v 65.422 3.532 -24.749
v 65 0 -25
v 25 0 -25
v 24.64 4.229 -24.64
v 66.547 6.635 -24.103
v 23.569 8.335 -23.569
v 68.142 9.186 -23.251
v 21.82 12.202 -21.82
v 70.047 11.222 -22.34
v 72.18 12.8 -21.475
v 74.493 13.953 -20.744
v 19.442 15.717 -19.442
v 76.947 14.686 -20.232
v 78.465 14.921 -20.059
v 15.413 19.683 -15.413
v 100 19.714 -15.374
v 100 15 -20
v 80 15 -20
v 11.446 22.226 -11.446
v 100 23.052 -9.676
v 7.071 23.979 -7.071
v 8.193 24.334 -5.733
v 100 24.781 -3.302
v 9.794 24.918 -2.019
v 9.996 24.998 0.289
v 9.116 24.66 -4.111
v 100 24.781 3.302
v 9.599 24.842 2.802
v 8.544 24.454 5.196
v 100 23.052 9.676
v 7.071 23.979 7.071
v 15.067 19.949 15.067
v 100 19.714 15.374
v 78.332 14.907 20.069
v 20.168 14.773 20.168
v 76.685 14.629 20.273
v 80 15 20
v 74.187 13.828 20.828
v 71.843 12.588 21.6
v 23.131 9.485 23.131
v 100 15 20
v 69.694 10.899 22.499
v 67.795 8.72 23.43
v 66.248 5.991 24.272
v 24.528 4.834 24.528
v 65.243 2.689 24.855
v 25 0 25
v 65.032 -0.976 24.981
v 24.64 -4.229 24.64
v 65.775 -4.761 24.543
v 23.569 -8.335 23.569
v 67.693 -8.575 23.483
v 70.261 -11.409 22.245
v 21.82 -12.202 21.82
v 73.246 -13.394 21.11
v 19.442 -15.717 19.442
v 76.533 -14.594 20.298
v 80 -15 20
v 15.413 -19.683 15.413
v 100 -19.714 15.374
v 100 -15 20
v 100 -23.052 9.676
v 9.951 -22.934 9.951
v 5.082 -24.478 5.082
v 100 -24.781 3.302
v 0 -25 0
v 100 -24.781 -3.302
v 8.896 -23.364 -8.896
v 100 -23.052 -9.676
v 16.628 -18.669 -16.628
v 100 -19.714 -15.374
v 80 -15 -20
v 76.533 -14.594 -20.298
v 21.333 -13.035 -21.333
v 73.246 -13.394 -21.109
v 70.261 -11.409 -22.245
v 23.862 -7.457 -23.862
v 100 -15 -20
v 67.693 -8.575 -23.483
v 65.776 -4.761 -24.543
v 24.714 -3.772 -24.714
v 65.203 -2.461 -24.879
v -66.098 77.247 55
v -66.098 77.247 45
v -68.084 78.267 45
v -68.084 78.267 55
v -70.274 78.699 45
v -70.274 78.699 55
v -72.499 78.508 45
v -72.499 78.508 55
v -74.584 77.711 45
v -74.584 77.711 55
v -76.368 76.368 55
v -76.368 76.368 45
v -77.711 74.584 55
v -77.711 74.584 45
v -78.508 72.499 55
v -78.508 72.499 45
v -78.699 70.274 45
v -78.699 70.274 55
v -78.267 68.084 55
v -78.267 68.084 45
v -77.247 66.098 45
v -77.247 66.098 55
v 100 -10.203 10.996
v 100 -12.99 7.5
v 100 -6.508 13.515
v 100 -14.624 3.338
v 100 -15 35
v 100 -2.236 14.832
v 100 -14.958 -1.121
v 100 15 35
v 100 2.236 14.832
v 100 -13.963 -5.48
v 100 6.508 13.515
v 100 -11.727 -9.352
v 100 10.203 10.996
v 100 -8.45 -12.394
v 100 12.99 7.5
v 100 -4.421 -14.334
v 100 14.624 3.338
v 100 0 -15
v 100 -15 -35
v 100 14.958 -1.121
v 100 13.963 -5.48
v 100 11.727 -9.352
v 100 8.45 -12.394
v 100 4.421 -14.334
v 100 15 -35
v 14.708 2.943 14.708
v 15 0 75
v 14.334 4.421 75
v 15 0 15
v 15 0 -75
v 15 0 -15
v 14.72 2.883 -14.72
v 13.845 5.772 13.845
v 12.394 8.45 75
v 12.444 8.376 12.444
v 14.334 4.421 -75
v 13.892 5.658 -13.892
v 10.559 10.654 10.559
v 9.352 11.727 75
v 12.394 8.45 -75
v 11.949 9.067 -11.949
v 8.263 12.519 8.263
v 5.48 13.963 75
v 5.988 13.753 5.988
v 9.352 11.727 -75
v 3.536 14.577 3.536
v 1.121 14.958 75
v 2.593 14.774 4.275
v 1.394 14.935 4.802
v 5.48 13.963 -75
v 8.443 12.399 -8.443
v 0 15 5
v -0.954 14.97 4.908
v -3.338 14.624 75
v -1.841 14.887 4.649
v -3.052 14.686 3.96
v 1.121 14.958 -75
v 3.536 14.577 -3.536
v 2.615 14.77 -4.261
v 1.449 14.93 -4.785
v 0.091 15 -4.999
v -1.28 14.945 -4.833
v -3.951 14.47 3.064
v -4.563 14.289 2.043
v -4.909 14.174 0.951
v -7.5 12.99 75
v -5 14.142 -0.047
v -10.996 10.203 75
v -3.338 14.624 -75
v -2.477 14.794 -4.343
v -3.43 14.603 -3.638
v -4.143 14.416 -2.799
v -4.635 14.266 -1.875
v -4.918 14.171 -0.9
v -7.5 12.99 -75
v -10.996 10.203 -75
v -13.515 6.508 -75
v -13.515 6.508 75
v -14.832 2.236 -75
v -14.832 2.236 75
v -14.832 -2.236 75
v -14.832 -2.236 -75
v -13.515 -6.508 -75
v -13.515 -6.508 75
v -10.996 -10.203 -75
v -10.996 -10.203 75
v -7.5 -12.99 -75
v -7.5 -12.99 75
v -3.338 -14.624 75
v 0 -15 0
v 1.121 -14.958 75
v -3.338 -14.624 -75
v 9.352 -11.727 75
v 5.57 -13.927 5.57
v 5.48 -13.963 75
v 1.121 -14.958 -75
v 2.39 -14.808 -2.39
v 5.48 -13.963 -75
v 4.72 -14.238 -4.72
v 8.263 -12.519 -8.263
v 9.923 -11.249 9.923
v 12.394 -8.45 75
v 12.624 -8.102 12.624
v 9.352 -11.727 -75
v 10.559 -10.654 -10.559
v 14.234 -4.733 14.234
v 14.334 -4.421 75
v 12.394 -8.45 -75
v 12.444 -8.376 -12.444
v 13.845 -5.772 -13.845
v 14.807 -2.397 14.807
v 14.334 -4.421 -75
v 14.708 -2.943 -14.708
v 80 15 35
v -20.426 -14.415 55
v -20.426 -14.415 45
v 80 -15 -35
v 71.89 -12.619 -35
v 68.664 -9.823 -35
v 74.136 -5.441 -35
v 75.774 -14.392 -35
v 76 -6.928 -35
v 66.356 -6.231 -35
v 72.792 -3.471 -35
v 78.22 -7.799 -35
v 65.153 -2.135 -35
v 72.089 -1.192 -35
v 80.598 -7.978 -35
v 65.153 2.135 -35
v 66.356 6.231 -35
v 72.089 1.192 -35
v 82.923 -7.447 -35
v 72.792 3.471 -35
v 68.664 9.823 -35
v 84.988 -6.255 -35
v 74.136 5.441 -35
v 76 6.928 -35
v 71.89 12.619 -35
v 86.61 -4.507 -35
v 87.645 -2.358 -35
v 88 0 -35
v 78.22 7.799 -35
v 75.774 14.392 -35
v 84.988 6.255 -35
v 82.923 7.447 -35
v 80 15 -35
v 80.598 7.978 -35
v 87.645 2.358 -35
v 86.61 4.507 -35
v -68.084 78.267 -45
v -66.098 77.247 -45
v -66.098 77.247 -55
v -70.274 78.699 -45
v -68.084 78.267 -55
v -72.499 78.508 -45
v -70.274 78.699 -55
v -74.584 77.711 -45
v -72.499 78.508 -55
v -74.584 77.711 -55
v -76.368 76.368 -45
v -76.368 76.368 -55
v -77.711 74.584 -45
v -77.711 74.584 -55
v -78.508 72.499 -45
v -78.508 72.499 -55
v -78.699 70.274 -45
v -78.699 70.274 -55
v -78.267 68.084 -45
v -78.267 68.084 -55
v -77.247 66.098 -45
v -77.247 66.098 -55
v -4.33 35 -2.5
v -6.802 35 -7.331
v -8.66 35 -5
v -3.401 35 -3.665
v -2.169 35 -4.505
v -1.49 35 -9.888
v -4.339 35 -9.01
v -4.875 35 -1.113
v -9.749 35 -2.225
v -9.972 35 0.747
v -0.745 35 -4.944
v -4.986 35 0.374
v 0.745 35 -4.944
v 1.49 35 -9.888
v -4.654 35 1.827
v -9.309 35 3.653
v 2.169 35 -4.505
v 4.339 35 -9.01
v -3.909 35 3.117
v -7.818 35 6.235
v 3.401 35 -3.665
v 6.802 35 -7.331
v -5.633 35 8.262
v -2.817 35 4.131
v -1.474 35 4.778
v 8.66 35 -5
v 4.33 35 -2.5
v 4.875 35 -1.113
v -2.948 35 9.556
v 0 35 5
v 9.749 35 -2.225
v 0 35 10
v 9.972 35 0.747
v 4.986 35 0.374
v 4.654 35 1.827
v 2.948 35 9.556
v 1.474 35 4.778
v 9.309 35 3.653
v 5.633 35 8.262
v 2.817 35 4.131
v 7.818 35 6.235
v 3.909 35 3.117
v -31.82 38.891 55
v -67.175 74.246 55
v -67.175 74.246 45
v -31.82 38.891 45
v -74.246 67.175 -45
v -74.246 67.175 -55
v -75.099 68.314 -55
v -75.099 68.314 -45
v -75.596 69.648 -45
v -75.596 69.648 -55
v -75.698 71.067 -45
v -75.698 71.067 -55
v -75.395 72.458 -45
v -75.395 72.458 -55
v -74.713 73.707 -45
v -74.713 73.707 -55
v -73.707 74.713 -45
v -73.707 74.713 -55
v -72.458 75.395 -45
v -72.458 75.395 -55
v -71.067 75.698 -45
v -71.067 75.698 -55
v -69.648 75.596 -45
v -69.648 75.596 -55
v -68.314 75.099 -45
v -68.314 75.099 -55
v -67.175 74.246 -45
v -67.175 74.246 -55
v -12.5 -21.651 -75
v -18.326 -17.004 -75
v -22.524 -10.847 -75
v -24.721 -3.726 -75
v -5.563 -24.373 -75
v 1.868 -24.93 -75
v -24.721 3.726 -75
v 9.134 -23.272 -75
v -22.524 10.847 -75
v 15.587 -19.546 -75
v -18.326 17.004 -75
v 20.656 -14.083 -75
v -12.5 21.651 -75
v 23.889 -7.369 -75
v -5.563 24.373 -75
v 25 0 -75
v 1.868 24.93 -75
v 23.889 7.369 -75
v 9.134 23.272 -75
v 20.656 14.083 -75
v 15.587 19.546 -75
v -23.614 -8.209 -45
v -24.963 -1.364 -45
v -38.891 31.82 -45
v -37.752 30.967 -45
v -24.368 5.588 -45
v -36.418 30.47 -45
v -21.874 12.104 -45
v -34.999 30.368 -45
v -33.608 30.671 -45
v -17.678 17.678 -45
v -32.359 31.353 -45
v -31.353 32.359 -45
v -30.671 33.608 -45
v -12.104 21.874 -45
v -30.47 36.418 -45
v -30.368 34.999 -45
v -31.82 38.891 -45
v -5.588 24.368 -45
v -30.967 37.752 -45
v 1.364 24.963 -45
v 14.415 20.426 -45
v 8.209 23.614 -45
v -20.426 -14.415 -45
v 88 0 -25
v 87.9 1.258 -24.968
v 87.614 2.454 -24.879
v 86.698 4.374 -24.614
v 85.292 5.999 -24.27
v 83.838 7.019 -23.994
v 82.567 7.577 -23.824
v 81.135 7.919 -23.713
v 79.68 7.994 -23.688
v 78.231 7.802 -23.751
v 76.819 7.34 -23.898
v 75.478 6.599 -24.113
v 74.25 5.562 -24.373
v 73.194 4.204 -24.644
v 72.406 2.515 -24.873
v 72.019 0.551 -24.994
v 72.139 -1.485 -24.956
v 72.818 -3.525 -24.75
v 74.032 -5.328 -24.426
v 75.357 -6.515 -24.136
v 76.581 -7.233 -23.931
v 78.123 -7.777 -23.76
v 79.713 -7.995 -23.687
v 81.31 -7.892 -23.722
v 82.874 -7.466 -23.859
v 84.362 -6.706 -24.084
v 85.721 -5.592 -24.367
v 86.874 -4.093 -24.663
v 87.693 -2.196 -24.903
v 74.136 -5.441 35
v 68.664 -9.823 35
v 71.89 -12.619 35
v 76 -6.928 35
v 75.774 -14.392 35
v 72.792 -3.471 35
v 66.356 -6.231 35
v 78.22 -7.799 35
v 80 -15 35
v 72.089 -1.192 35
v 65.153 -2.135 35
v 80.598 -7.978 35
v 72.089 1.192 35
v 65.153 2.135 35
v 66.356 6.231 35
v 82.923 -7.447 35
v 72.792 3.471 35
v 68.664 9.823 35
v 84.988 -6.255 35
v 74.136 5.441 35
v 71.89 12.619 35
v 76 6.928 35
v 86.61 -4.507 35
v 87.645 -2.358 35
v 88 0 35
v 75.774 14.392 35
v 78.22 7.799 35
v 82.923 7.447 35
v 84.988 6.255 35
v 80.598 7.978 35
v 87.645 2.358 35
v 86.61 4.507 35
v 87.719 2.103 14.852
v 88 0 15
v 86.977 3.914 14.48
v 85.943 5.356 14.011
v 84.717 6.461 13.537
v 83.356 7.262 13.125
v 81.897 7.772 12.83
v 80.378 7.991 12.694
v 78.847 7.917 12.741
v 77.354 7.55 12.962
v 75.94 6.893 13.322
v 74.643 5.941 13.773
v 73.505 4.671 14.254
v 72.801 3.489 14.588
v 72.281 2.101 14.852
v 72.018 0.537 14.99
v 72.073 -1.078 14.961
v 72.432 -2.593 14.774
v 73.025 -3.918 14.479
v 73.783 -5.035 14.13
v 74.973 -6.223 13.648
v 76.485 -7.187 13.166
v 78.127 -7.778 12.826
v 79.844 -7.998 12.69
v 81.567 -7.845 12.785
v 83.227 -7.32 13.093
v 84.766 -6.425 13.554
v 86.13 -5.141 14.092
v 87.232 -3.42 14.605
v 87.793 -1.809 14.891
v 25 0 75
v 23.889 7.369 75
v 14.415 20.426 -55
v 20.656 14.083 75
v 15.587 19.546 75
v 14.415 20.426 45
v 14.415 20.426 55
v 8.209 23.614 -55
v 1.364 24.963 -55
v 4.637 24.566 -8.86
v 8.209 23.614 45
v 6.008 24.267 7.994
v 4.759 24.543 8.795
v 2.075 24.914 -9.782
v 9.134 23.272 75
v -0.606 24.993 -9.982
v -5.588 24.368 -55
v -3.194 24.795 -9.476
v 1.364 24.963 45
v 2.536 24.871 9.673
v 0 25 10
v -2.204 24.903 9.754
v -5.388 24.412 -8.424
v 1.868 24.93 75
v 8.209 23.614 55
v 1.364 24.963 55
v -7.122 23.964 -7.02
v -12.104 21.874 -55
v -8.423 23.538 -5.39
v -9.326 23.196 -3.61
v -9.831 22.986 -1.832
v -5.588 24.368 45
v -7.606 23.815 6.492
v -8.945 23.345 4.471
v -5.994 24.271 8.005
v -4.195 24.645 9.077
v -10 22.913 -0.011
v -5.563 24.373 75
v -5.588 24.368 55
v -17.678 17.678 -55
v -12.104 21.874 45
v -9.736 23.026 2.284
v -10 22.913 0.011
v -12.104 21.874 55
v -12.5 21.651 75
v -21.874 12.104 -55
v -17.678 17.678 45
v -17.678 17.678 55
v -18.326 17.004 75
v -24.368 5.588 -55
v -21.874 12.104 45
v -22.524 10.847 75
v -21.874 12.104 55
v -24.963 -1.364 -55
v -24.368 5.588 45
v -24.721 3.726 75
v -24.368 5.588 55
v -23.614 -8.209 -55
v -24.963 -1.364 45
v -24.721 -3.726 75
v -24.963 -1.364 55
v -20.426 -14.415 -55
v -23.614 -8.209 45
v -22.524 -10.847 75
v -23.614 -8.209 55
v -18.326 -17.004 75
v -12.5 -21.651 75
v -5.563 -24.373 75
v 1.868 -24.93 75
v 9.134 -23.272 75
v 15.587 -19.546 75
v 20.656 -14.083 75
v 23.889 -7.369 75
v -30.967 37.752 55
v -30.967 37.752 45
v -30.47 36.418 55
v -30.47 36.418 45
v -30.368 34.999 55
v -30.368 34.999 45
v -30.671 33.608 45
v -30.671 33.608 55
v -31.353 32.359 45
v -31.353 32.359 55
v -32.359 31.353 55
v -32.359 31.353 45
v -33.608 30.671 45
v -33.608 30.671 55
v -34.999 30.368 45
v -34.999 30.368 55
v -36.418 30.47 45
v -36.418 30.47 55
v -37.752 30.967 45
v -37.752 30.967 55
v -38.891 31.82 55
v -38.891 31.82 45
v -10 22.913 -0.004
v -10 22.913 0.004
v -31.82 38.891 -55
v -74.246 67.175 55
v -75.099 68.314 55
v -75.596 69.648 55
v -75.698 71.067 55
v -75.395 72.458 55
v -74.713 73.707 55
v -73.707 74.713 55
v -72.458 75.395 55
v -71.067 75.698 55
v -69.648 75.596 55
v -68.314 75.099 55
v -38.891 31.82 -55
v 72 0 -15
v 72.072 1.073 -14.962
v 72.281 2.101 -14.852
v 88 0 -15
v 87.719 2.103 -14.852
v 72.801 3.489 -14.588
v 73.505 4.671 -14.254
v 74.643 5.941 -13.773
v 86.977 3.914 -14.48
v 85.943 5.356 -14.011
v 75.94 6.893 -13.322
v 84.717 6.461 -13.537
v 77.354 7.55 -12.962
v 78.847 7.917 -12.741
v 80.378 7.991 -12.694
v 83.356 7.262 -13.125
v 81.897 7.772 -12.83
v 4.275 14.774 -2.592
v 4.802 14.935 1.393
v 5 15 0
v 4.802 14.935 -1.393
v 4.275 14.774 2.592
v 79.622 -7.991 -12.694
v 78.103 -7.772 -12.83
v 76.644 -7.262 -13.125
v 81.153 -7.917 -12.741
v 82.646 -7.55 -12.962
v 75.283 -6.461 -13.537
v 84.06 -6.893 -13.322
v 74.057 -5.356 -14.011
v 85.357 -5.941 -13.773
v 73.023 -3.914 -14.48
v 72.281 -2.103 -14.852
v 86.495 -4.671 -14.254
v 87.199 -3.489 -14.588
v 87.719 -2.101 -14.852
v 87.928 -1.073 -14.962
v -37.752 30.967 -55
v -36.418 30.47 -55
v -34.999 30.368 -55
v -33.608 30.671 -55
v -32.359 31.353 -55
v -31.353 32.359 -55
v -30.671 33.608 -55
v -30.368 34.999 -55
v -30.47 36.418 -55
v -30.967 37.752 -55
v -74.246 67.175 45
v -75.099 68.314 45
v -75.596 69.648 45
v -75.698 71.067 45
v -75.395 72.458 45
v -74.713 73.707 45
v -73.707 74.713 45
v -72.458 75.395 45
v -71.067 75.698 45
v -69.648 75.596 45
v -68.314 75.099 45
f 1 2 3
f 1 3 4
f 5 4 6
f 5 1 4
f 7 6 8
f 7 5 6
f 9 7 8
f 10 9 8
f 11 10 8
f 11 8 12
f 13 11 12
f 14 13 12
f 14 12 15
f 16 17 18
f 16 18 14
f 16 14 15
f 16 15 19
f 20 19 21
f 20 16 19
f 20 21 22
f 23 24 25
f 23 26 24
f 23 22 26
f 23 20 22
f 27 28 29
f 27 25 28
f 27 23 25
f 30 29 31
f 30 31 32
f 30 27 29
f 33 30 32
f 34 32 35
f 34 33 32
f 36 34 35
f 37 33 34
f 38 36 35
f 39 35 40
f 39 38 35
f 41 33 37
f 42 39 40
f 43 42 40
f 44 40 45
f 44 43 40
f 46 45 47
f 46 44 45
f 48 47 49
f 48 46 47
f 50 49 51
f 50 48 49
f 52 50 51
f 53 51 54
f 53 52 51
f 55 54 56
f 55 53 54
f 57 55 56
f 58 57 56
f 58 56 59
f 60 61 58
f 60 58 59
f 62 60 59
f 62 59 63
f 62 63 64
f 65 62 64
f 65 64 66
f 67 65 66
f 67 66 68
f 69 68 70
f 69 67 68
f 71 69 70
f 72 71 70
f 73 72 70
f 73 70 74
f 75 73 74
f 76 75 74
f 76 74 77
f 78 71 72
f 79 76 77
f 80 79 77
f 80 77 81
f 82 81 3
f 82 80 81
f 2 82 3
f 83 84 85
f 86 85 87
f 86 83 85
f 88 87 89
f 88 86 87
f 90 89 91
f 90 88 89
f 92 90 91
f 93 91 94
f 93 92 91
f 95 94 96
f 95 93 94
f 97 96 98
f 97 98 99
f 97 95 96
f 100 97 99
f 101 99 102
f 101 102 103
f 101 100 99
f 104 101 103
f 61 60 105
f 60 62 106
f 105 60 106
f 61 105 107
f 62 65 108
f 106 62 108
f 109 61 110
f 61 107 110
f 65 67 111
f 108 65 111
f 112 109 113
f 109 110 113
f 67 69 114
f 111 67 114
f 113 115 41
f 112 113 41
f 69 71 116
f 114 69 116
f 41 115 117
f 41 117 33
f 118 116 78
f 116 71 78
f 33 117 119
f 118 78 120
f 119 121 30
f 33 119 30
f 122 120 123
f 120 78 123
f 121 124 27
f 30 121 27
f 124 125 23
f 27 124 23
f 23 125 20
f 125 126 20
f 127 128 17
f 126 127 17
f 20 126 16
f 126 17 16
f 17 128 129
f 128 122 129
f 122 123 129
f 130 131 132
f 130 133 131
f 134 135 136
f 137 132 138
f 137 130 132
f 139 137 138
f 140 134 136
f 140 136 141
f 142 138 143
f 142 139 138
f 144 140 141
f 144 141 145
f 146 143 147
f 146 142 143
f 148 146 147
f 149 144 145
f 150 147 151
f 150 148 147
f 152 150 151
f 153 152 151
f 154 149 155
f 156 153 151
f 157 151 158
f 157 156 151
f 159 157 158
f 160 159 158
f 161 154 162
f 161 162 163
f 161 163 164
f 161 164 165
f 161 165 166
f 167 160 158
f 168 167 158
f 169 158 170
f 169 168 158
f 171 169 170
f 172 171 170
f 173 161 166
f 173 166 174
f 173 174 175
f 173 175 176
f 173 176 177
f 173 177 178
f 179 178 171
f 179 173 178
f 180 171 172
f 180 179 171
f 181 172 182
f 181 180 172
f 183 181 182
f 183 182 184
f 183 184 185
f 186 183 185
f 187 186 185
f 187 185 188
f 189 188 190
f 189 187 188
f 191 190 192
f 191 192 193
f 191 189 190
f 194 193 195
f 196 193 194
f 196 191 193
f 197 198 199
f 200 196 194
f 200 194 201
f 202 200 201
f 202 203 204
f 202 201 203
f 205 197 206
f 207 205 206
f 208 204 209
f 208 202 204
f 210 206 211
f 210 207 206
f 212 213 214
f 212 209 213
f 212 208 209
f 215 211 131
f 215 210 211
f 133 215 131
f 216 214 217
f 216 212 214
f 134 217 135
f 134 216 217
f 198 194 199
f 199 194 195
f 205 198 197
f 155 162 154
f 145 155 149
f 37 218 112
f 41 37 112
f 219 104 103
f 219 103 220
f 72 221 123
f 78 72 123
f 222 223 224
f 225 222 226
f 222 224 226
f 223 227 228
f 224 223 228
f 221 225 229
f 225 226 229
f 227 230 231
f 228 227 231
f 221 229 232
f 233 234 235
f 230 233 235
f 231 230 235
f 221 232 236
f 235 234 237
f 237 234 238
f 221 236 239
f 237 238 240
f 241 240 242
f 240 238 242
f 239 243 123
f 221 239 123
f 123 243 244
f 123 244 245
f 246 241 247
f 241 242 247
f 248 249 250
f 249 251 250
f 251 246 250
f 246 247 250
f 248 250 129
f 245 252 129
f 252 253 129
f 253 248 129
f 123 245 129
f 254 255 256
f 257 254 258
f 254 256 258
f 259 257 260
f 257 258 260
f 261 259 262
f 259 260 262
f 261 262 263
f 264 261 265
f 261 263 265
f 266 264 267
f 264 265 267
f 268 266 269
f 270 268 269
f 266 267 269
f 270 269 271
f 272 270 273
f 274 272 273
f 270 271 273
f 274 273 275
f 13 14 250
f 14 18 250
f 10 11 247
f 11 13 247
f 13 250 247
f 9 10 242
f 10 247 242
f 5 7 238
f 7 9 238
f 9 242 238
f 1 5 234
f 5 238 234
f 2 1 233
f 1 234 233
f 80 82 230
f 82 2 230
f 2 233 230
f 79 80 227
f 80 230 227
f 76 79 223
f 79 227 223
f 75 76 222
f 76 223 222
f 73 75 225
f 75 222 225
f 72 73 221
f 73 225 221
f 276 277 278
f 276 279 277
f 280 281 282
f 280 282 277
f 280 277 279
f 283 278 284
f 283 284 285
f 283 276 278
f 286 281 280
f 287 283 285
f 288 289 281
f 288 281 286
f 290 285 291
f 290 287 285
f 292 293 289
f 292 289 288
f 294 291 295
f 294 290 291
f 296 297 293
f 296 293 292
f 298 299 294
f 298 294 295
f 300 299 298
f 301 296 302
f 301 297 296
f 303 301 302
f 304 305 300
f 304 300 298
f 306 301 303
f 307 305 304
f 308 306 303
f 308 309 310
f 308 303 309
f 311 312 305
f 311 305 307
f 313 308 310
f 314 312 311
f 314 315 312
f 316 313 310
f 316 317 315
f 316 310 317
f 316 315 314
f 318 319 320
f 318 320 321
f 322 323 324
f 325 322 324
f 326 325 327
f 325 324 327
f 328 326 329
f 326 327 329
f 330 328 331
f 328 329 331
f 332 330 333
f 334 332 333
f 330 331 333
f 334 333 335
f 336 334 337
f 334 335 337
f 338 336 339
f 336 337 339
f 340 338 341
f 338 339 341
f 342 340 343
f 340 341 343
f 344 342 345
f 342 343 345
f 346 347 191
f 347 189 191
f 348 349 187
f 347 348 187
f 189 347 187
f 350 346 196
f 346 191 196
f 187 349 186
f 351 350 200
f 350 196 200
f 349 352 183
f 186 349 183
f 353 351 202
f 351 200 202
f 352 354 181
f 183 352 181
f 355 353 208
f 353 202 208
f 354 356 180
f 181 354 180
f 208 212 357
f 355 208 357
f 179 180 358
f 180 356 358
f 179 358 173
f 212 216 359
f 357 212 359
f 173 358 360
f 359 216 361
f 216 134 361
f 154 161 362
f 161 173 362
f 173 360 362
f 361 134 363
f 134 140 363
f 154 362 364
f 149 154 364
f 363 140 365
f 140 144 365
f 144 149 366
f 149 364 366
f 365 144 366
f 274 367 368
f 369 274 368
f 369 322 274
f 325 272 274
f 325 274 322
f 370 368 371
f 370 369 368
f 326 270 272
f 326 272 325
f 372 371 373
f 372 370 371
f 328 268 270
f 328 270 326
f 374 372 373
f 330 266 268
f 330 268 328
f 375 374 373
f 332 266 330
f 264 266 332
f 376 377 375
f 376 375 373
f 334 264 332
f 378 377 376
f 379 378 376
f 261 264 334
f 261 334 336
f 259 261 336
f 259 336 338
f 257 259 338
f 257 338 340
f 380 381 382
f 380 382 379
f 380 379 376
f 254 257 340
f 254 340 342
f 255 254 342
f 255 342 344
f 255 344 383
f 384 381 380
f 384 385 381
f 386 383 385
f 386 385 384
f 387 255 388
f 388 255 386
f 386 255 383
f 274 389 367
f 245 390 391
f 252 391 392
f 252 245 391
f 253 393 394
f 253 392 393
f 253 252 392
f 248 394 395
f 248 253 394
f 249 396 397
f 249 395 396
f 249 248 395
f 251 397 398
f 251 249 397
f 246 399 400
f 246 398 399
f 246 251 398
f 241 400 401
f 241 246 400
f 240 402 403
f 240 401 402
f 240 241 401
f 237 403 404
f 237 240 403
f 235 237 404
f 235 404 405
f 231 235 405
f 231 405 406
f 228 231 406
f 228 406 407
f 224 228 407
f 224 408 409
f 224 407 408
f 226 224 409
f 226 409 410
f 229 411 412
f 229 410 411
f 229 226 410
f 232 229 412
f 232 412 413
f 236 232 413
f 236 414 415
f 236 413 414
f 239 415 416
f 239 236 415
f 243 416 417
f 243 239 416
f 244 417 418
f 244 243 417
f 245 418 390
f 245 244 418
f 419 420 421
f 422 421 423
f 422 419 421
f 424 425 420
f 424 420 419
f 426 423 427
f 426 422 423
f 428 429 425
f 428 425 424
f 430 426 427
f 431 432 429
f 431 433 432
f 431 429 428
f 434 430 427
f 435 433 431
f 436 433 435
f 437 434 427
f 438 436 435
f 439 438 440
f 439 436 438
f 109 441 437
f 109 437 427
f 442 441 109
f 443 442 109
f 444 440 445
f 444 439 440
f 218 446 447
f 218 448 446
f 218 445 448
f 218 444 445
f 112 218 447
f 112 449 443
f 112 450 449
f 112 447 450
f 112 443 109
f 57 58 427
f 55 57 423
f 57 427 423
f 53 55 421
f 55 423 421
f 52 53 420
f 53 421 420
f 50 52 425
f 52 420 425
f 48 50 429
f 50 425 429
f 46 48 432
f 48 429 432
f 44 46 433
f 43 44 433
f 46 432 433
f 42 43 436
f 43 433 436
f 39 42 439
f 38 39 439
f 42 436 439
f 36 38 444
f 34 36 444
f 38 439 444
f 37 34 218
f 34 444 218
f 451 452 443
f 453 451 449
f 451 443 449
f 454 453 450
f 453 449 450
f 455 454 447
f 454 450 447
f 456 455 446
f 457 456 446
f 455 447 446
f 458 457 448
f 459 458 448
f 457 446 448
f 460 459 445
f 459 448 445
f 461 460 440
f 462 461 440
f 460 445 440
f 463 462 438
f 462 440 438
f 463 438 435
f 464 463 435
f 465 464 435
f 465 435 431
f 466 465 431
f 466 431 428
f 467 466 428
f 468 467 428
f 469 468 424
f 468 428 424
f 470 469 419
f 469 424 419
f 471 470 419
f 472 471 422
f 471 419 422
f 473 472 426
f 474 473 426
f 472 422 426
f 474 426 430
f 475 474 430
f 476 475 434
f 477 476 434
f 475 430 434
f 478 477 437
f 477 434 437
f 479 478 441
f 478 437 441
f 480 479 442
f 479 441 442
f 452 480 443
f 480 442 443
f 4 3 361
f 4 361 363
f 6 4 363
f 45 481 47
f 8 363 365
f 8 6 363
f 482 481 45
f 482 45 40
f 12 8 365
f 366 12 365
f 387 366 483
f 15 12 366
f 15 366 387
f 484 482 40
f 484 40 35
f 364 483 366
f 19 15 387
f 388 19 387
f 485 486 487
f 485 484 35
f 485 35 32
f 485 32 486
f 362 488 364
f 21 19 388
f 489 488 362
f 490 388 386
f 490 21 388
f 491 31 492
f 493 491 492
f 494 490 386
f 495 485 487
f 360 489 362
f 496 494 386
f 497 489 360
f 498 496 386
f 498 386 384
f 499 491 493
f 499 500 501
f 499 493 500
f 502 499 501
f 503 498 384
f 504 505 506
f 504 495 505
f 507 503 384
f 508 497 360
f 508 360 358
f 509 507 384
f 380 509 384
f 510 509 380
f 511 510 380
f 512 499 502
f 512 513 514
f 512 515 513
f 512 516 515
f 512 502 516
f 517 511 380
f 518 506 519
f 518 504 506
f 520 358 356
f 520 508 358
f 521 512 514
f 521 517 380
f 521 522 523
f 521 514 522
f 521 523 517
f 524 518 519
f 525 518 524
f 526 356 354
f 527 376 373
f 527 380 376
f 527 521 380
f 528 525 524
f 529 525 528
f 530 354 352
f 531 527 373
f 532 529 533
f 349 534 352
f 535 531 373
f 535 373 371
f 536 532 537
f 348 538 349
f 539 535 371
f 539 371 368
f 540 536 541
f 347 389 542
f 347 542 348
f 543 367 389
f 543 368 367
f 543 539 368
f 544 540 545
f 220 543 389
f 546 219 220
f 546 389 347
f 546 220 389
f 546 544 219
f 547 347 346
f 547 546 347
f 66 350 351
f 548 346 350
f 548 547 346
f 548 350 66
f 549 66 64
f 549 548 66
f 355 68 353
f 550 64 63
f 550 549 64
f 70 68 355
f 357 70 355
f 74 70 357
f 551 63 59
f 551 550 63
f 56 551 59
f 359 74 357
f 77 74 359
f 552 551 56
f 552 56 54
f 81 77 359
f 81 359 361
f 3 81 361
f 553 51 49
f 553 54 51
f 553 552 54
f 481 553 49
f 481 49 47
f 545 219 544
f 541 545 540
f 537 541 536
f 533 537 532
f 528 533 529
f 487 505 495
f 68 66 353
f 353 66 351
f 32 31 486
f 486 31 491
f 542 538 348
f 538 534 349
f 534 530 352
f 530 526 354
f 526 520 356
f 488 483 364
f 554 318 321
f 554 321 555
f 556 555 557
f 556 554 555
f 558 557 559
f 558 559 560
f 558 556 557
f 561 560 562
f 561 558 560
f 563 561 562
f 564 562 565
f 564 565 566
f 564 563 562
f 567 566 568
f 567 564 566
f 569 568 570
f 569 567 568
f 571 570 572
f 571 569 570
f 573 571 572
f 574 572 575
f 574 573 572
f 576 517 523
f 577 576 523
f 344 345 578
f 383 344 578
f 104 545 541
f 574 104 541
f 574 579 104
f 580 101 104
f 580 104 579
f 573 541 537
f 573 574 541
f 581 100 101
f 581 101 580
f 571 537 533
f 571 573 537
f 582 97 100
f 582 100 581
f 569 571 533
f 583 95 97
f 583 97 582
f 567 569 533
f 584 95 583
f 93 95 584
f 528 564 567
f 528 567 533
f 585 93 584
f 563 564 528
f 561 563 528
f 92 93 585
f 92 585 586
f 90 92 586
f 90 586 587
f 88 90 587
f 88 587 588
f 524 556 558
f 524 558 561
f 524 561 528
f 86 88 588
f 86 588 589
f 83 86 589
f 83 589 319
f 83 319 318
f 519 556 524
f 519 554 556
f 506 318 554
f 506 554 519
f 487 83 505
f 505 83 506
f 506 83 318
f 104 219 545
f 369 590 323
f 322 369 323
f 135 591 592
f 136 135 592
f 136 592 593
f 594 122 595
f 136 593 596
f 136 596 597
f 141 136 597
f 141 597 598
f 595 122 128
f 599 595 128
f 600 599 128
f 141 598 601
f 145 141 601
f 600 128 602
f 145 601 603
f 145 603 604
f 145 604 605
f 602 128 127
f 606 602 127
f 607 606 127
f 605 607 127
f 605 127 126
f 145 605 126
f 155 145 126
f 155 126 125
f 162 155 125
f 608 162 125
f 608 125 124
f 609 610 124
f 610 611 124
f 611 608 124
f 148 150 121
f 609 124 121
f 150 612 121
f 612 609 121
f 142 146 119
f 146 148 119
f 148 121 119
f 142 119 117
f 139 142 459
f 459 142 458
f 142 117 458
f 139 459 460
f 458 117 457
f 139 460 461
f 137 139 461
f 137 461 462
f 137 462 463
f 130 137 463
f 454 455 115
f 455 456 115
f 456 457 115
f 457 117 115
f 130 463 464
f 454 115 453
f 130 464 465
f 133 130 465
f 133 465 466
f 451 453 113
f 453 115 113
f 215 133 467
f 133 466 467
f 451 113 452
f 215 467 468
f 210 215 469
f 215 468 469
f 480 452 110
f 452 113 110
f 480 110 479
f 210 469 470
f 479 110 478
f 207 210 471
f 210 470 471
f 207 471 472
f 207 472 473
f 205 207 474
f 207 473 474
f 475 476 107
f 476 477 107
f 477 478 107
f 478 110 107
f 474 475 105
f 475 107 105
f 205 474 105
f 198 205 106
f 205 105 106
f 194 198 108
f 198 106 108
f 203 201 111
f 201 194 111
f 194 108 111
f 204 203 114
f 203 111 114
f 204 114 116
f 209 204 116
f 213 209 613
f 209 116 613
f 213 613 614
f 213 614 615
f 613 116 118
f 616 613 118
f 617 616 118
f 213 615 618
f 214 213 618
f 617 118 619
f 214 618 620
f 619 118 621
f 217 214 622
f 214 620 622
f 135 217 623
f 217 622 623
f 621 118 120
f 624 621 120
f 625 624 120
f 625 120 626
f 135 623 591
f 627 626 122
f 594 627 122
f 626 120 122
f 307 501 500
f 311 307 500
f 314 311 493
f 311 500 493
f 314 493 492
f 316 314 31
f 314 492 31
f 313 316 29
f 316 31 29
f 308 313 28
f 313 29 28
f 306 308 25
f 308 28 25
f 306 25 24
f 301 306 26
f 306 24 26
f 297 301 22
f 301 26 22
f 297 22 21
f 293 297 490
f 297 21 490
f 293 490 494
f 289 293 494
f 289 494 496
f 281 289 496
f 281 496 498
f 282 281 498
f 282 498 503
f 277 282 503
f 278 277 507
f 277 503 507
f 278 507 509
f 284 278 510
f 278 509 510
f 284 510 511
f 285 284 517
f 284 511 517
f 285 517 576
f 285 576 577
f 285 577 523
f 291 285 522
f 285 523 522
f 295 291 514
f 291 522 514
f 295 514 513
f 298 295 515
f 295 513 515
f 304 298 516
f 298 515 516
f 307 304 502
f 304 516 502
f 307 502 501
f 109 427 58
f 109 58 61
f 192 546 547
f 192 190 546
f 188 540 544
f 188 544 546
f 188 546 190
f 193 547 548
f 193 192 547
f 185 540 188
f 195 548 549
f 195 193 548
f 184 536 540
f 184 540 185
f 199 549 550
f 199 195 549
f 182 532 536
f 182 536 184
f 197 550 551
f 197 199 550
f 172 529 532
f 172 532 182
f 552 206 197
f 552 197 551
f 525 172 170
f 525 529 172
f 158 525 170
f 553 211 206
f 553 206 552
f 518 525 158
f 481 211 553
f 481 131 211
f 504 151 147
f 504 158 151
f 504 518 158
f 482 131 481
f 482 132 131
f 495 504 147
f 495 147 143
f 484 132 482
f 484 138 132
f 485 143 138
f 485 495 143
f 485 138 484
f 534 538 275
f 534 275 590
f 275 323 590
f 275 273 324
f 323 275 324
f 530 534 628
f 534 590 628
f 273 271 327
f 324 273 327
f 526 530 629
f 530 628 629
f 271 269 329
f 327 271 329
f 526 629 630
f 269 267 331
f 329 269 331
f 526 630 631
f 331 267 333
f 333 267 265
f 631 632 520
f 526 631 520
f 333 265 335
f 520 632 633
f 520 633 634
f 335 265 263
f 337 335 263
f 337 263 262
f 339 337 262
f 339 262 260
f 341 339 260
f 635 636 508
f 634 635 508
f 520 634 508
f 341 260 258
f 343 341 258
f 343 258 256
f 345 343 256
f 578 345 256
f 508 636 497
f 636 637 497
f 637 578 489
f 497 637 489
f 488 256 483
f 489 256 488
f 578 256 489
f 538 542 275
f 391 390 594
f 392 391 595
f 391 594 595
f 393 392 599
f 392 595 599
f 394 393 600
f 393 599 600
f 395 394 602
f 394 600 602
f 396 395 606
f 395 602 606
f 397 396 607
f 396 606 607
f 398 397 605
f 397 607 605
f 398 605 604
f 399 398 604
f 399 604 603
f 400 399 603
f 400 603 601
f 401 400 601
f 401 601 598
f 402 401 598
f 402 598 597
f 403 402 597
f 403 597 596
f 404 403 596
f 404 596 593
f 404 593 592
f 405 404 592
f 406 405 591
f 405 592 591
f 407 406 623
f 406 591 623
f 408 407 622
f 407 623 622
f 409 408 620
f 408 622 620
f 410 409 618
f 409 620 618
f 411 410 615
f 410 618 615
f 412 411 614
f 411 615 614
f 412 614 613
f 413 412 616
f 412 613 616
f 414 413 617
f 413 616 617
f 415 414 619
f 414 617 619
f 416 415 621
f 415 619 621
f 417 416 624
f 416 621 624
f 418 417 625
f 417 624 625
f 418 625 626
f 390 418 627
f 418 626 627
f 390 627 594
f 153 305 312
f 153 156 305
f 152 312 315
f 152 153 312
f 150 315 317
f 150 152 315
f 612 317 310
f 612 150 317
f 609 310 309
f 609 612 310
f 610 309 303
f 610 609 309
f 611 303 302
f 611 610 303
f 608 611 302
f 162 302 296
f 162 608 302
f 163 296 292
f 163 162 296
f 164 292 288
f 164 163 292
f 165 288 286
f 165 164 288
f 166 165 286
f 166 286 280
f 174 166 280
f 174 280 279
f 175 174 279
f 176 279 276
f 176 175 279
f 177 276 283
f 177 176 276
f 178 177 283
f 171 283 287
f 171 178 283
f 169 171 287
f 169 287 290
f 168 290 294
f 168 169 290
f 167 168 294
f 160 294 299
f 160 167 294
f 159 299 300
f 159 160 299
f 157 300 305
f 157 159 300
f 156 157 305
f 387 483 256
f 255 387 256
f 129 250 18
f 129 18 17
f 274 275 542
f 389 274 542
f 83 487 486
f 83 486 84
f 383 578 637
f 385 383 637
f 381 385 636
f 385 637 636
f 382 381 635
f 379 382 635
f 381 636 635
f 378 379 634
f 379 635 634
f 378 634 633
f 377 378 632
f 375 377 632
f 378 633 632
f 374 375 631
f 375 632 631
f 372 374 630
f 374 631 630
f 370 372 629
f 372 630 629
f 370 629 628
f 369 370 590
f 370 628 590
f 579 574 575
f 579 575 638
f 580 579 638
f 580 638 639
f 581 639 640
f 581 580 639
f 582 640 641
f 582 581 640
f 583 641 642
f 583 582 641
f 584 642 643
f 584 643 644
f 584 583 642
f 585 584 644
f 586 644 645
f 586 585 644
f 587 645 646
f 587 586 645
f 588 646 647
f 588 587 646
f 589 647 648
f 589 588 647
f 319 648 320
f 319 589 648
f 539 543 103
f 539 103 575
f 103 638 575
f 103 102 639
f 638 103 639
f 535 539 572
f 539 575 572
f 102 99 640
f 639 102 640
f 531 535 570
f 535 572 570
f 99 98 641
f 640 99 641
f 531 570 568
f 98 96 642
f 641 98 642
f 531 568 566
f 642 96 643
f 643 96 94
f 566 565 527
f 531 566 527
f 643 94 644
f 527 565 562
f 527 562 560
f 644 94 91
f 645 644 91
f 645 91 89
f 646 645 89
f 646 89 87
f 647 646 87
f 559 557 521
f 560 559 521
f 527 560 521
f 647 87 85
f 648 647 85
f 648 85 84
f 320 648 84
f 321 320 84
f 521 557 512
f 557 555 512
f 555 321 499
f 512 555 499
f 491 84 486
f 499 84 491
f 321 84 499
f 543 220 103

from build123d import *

# Parameters (mm, degrees)
CROQUIS1_R                   = 25
CROQUIS1_R_2                 = 15
SALIENTE_EXTRUIR1_DEPTH      = 75
SALIENTE_EXTRUIR3_REACH      = 184.916
SALIENTE_EXTRUIR3_END_RADIUS = 25
SALIENTE_EXTRUIR3_START      = 100
CROQUIS2_R                   = 25
CROQUIS2_R_2                 = 15
CORTAR_EXTRUIR1_REACH        = 129.475
CROQUIS2_2_R                 = 15
SALIENTE_EXTRUIR4_REACH      = 164.475
SALIENTE_EXTRUIR4_END_RADIUS = 25
SALIENTE_EXTRUIR4_START      = 35
CROQUIS3_W                   = 35
CROQUIS3_H                   = 30
REDONDEO1_R                  = 15
CROQUIS4_R                   = 8
CORTAR_EXTRUIR2_DEPTH        = 151.7481344
SALIENTE_EXTRUIR5_START      = 55
SALIENTE_EXTRUIR5_DEPTH      = 10
SALIENTE_EXTRUIR6_START      = 22.912881
CROQUIS6_R                   = 10
CROQUIS6_R_2                 = 5
SALIENTE_EXTRUIR6_DEPTH      = 12.087119
CORTAR_EXTRUIR3_REACH        = 149.717
CROQUIS6_2_R                 = 5
REDONDEO1_OF_SIMETR_A1_R     = 15


with BuildPart() as part:
    # Croquis1 → Saliente-Extruir1 (new, symmetric)
    with BuildSketch(Plane.XY):
        Circle(CROQUIS1_R)
        Circle(CROQUIS1_R_2, mode=Mode.SUBTRACT)
    extrude(amount=SALIENTE_EXTRUIR1_DEPTH, both=True)

    # Saliente-Extruir3: up to this cylinder (the profile starts outside it)
    saliente_extruir3_end = Plane(origin=(0, 0, 24.292893), z_dir=(0, 0, -1)) * Cylinder(SALIENTE_EXTRUIR3_END_RADIUS, 420.832, mode=Mode.PRIVATE)
    # Croquis2 → Saliente-Extruir3 (add, up to the surface)
    with BuildSketch(Plane(origin=(0, 0, 0), x_dir=(0, 0, -1), z_dir=(1, 0, 0)).offset(SALIENTE_EXTRUIR3_START), mode=Mode.PRIVATE) as saliente_extruir3_sk1:
        Circle(CROQUIS2_R)
        Circle(CROQUIS2_R_2, mode=Mode.SUBTRACT)
    saliente_extruir3_tool1 = extrude(saliente_extruir3_sk1.sketch, amount=-SALIENTE_EXTRUIR3_REACH, mode=Mode.PRIVATE) - saliente_extruir3_end
    add(saliente_extruir3_tool1.solids().sort_by_distance((100, 0, 24.292893))[0])

    # Croquis2<2> → Cortar-Extruir1 (cut, up to next)
    with BuildSketch(Plane(origin=(0, 0, 0), x_dir=(0, 0, -1), z_dir=(1, 0, 0)), mode=Mode.PRIVATE) as cortar_extruir1_sk1:
        Circle(CROQUIS2_2_R)
    cortar_extruir1_tool1 = extrude(cortar_extruir1_sk1.sketch, amount=CORTAR_EXTRUIR1_REACH, mode=Mode.PRIVATE) & part.part
    add(cortar_extruir1_tool1.solids().sort_by_distance((0, 0, 0))[0], mode=Mode.SUBTRACT)

    # Saliente-Extruir4: up to this cylinder (the profile starts outside it)
    saliente_extruir4_end = Plane(origin=(82.5, 0, 0), z_dir=(1, 0, 0)) * Cylinder(SALIENTE_EXTRUIR4_END_RADIUS, 379.95, mode=Mode.PRIVATE)
    # Croquis3 → Saliente-Extruir4 (add, up to the surface)
    with BuildSketch(Plane.XY.offset(SALIENTE_EXTRUIR4_START), mode=Mode.PRIVATE) as saliente_extruir4_sk1:
        with Locations((82.5, 0)):
            Rectangle(CROQUIS3_W, CROQUIS3_H)
    saliente_extruir4_tool1 = extrude(saliente_extruir4_sk1.sketch, amount=-SALIENTE_EXTRUIR4_REACH, mode=Mode.PRIVATE) - saliente_extruir4_end
    saliente_extruir4 = saliente_extruir4_tool1.solids().sort_by_distance((82.5, 0, 35))[0]
    add(saliente_extruir4)

    # Redondeo1
    # the kernel refuses this fillet: 15 mm, written as the material it takes off along each edge
    with BuildSketch(Plane(origin=(65, 15, 72.5), x_dir=(1, 0, 0), z_dir=(0, 0, -1))) as redondeo1_piece_1_section:
        with BuildLine():
            CenterArc((REDONDEO1_R, REDONDEO1_R), REDONDEO1_R, 180, 90)
            Line((0, REDONDEO1_R), (0, 0))
            Line((0, 0), (REDONDEO1_R, 0))
        make_face()
    redondeo1_piece_1 = extrude(amount=90, mode=Mode.PRIVATE)
    redondeo1_piece_1 = redondeo1_piece_1 - Plane(origin=(68.454600716, 0, 0), x_dir=(0, 0, -1), z_dir=(1, 0, 0)) * Cylinder(25, 240, mode=Mode.PRIVATE)
    add(redondeo1_piece_1, mode=Mode.SUBTRACT)
    with BuildSketch(Plane(origin=(65, -15, 72.5), x_dir=(0, 1, 0), z_dir=(0, 0, -1))) as redondeo1_piece_2_section:
        with BuildLine():
            CenterArc((REDONDEO1_R, REDONDEO1_R), REDONDEO1_R, 180, 90)
            Line((0, REDONDEO1_R), (0, 0))
            Line((0, 0), (REDONDEO1_R, 0))
        make_face()
    redondeo1_piece_2 = extrude(amount=90, mode=Mode.PRIVATE)
    redondeo1_piece_2 = redondeo1_piece_2 - Plane(origin=(68.454600972, 0, 0), x_dir=(0, 0, -1), z_dir=(1, 0, 0)) * Cylinder(25, 240, mode=Mode.PRIVATE)
    add(redondeo1_piece_2, mode=Mode.SUBTRACT)

    # Croquis4 → Cortar-Extruir2 (cut, through all)
    with BuildSketch(Plane.XY.offset(35)):
        with Locations((80, 0)):
            Circle(CROQUIS4_R)
    cortar_extruir2 = extrude(amount=-CORTAR_EXTRUIR2_DEPTH, mode=Mode.SUBTRACT)

    # Croquis5 → Saliente-Extruir5 (add)
    with BuildSketch(Plane.XY.offset(SALIENTE_EXTRUIR5_START)):
        with BuildLine():
            ThreePointArc((-20.425558294, -14.415150654), (-17.67766953, 17.67766953), (14.415150654, 20.425558294))
            Line((14.415150654, 20.425558294), (-66.097829909, 77.246856773))
            ThreePointArc((-66.097829909, 77.246856773), (-76.367532368, 76.367532368), (-77.246856773, 66.097829909))
            Line((-77.246856773, 66.097829909), (-20.425558294, -14.415150654))
        make_face()
        with BuildLine():
            ThreePointArc((-74.246212025, 67.175144213), (-74.246212025, 74.246212025), (-67.175144213, 74.246212025))
            Line((-67.175144213, 74.246212025), (-31.819805153, 38.890872965))
            ThreePointArc((-31.819805153, 38.890872965), (-31.819805153, 31.819805153), (-38.890872965, 31.819805153))
            Line((-38.890872965, 31.819805153), (-74.246212025, 67.175144213))
        make_face(mode=Mode.SUBTRACT)
    saliente_extruir5 = extrude(amount=-SALIENTE_EXTRUIR5_DEPTH)

    # Croquis6 → Saliente-Extruir6 (add)
    with BuildSketch(Plane(origin=(0, 0, 0), x_dir=(1, 0, 0), z_dir=(0, 1, 0)).offset(SALIENTE_EXTRUIR6_START)):
        with Locations(Location((0, 0, 0), (0, 0, 270))):
            Circle(CROQUIS6_R)
        with Locations(Location((0, 0, 0), (0, 0, 270))):
            Circle(CROQUIS6_R_2, mode=Mode.SUBTRACT)
    extrude(amount=SALIENTE_EXTRUIR6_DEPTH)

    # Croquis6<2> → Cortar-Extruir3 (cut, up to next)
    with BuildSketch(Plane(origin=(0, 0, 0), x_dir=(1, 0, 0), z_dir=(0, 1, 0)), mode=Mode.PRIVATE) as cortar_extruir3_sk1:
        with Locations(Location((0, 0, 0), (0, 0, 270))):
            Circle(CROQUIS6_2_R)
    cortar_extruir3_tool1 = extrude(cortar_extruir3_sk1.sketch, amount=CORTAR_EXTRUIR3_REACH, mode=Mode.PRIVATE) & part.part
    add(cortar_extruir3_tool1.solids().sort_by_distance((0, 0, 0))[0], mode=Mode.SUBTRACT)

    # Simetría1: Saliente-Extruir4, Cortar-Extruir2, Saliente-Extruir5 across plane
    add(saliente_extruir4.mirror(Plane.XY))
    add(cortar_extruir2.mirror(Plane.XY), mode=Mode.SUBTRACT)
    add(saliente_extruir5.mirror(Plane.XY))

    # Redondeo1 of Simetría1
    # the kernel refuses this fillet: 15 mm, written as the material it takes off along each edge
    with BuildSketch(Plane(origin=(65, 15, -72.5), x_dir=(0, -1, 0), z_dir=(0, 0, 1))) as redondeo1_of_simetr_a1_piece_1_section:
        with BuildLine():
            CenterArc((REDONDEO1_OF_SIMETR_A1_R, REDONDEO1_OF_SIMETR_A1_R), REDONDEO1_OF_SIMETR_A1_R, 180, 90)
            Line((0, REDONDEO1_OF_SIMETR_A1_R), (0, 0))
            Line((0, 0), (REDONDEO1_OF_SIMETR_A1_R, 0))
        make_face()
    redondeo1_of_simetr_a1_piece_1 = extrude(amount=90, mode=Mode.PRIVATE)
    redondeo1_of_simetr_a1_piece_1 = redondeo1_of_simetr_a1_piece_1 - Plane(origin=(68.454600972, 0, 0), x_dir=(0, 0, -1), z_dir=(1, 0, 0)) * Cylinder(25, 240, mode=Mode.PRIVATE)
    add(redondeo1_of_simetr_a1_piece_1, mode=Mode.SUBTRACT)
    with BuildSketch(Plane(origin=(65, -15, -72.5), x_dir=(0, 1, 0), z_dir=(0, 0, 1))) as redondeo1_of_simetr_a1_piece_2_section:
        with BuildLine():
            CenterArc((REDONDEO1_OF_SIMETR_A1_R, -REDONDEO1_OF_SIMETR_A1_R), REDONDEO1_OF_SIMETR_A1_R, 90, 90)
            Line((0, -REDONDEO1_OF_SIMETR_A1_R), (0, 0))
            Line((0, 0), (REDONDEO1_OF_SIMETR_A1_R, 0))
        make_face()
    redondeo1_of_simetr_a1_piece_2 = extrude(amount=90, mode=Mode.PRIVATE)
    redondeo1_of_simetr_a1_piece_2 = redondeo1_of_simetr_a1_piece_2 - Plane(origin=(68.454600579, 0, 0), x_dir=(0, 0, -1), z_dir=(1, 0, 0)) * Cylinder(25, 240, mode=Mode.PRIVATE)
    add(redondeo1_of_simetr_a1_piece_2, mode=Mode.SUBTRACT)


solid = part.part
